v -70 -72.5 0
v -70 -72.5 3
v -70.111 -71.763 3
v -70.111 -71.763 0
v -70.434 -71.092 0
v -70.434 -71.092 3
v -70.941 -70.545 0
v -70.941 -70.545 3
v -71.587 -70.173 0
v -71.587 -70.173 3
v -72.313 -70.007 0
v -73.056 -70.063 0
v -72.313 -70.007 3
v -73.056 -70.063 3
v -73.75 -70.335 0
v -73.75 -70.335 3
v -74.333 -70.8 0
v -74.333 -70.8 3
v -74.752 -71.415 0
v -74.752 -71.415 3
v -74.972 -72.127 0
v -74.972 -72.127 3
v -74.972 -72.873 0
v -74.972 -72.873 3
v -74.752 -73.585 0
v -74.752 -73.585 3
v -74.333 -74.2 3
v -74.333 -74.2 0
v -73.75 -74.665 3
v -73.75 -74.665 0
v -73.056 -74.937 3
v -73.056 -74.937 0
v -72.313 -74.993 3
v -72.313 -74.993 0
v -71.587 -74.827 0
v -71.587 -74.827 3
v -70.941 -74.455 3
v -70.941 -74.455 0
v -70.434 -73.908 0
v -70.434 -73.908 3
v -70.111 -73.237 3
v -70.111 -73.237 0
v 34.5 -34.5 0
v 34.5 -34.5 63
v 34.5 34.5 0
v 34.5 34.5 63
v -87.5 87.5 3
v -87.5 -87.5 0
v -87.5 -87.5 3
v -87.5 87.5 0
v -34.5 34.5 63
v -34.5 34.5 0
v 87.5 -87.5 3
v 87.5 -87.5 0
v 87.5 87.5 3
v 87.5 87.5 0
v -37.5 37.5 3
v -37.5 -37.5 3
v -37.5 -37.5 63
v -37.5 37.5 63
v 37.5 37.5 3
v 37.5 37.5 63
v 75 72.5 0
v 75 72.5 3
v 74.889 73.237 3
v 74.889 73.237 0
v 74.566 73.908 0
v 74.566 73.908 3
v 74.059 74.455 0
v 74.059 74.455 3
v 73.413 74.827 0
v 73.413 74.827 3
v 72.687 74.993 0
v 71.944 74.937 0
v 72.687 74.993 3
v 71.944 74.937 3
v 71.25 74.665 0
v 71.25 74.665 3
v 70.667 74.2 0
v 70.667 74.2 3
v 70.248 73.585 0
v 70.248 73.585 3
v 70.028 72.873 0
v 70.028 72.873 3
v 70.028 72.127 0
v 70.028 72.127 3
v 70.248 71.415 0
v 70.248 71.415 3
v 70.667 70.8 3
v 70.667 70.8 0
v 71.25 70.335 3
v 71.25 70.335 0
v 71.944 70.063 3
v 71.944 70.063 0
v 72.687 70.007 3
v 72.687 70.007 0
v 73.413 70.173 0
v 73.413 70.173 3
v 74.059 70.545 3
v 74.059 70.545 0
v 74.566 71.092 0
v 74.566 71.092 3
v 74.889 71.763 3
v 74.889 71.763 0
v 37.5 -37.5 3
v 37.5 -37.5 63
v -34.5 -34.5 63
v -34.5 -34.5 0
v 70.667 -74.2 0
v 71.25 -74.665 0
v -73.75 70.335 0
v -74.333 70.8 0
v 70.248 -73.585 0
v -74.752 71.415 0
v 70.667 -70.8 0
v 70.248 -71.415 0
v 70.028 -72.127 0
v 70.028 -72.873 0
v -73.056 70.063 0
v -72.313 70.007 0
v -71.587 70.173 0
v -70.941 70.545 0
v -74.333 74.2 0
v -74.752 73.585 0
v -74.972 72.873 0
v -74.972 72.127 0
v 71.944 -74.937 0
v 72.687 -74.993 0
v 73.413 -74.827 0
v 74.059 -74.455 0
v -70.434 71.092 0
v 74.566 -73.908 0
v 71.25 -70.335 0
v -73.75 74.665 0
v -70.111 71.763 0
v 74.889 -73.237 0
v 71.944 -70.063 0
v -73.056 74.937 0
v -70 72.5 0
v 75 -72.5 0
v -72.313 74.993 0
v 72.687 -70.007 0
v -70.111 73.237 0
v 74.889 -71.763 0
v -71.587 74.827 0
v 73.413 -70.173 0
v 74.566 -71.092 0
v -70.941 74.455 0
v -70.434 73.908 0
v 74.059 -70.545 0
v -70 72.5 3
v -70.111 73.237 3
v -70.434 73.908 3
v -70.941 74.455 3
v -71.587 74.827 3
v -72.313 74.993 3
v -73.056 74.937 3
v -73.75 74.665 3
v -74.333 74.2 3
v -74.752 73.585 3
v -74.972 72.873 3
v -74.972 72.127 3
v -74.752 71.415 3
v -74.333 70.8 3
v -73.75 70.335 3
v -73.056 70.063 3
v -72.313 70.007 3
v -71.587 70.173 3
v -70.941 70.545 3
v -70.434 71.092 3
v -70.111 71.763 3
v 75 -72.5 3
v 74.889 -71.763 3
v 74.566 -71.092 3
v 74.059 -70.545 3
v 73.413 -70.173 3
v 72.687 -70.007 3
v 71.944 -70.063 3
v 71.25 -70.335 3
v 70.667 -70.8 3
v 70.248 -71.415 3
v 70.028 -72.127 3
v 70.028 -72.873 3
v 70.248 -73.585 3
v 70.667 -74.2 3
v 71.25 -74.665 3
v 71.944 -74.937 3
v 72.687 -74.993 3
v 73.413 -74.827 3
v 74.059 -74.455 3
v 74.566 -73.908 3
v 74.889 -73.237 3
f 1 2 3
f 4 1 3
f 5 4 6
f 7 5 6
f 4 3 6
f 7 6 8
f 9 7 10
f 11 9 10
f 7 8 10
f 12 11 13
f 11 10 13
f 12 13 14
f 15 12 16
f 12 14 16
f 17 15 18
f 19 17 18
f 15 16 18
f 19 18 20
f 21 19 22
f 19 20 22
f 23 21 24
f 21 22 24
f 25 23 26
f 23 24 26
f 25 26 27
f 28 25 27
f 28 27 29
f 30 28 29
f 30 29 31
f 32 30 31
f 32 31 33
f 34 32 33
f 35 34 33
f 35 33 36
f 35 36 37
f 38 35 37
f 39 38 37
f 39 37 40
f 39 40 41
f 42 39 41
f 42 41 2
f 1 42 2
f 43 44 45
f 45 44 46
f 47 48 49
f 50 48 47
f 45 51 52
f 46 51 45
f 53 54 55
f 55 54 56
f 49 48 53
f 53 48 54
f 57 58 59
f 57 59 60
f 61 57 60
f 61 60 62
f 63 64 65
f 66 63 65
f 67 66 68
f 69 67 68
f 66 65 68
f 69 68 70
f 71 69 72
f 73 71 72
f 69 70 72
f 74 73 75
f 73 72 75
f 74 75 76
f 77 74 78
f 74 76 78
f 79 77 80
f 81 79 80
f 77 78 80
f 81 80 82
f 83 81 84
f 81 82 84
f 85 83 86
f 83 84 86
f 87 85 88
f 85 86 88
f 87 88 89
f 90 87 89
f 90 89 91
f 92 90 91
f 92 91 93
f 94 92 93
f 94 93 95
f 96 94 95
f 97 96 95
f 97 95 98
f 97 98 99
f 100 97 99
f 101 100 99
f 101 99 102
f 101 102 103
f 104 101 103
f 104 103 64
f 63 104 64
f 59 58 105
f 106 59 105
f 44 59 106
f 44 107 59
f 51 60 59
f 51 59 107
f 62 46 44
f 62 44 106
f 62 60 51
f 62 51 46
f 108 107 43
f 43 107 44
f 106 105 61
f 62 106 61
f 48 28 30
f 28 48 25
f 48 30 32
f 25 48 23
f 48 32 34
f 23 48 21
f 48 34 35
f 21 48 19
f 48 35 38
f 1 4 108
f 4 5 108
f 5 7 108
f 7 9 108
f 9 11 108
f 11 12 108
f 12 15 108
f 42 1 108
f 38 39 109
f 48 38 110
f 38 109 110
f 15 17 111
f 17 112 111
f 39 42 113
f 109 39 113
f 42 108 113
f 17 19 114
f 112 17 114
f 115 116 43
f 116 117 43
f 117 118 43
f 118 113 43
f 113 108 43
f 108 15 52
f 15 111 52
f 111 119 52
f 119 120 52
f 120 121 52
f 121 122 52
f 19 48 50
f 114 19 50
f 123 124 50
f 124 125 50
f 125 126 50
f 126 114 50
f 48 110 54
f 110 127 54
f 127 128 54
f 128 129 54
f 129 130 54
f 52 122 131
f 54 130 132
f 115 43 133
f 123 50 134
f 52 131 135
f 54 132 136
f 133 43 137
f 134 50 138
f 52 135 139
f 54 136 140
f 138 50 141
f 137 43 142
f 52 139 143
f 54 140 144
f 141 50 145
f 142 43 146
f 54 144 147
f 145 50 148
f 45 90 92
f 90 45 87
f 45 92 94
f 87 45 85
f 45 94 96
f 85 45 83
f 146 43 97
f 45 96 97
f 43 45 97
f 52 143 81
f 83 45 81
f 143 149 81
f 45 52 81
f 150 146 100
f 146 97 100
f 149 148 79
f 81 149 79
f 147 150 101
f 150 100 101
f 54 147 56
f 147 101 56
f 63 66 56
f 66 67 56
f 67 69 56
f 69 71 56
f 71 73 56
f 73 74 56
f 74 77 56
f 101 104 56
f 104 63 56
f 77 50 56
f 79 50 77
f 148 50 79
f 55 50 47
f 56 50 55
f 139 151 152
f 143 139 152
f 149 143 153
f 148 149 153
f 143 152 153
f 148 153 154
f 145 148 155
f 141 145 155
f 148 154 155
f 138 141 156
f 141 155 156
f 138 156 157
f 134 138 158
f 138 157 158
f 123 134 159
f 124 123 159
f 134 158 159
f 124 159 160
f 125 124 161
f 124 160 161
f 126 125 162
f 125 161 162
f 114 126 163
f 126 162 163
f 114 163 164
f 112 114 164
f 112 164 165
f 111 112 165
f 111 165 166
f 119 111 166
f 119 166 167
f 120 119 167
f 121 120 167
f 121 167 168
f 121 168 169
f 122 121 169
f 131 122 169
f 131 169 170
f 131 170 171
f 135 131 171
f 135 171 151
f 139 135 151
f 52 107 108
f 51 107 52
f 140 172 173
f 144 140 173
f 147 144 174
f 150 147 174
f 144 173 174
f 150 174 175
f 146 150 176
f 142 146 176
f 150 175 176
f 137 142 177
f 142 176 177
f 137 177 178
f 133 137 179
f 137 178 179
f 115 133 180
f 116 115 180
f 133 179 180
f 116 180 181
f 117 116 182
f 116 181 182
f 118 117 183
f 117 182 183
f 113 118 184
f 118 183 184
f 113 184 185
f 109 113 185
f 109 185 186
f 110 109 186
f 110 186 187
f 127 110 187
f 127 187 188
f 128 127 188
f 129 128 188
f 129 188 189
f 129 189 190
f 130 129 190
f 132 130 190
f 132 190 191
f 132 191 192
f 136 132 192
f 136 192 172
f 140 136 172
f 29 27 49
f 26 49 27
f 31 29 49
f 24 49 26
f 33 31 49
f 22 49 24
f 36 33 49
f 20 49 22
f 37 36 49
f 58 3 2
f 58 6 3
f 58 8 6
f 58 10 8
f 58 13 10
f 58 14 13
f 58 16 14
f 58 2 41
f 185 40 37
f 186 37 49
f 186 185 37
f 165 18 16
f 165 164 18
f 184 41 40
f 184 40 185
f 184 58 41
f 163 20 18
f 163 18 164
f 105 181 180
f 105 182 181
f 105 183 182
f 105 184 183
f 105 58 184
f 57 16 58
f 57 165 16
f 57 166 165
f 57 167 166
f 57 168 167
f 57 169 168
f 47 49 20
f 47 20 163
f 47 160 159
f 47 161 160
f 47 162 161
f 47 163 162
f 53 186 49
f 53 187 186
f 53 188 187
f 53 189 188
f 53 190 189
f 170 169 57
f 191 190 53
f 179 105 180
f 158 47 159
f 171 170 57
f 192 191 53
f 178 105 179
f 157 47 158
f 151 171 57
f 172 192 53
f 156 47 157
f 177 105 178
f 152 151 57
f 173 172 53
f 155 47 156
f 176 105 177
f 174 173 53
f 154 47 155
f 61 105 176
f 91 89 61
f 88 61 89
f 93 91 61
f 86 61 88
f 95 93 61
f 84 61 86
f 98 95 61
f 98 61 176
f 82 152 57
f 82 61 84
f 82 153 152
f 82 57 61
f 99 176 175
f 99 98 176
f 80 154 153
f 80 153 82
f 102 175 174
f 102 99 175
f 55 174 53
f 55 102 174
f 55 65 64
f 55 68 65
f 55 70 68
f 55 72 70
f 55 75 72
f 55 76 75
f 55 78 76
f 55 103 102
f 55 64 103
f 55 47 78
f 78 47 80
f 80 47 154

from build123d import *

# Parameters (mm, degrees)
SKETCH_W     = 175
SKETCH_H     = 175
PAD_DEPTH    = 3
SKETCH001_R  = 2.5
HOLE_DEPTH   = 3.001
SKETCH002_W  = 75
SKETCH002_H  = 75
PAD001_DEPTH = 60
SKETCH003_W  = 69
SKETCH003_H  = 69
POCKET_DEPTH = 63.001


with BuildPart() as part:
    # Sketch → Pad (new body)
    with BuildSketch(Plane.XY):
        Rectangle(SKETCH_W, SKETCH_H)
    extrude(amount=PAD_DEPTH)

    # Sketch001 (on Face6 of Pad) → Hole (cut, through all)
    with BuildSketch(Plane.XY.offset(3)):
        with Locations((-72.5, 72.5)):
            Circle(SKETCH001_R)
        with Locations((72.5, 72.5)):
            Circle(SKETCH001_R)
        with Locations((-72.5, -72.5)):
            Circle(SKETCH001_R)
        with Locations((72.5, -72.5)):
            Circle(SKETCH001_R)
    extrude(amount=-HOLE_DEPTH, mode=Mode.SUBTRACT)

    # Sketch002 (on Face5 of Hole) → Pad001 (join)
    with BuildSketch(Plane.XY.offset(3)):
        Rectangle(SKETCH002_W, SKETCH002_H)
    extrude(amount=PAD001_DEPTH)

    # Sketch003 (on Face15 of Pad001) → Pocket (cut, through all)
    with BuildSketch(Plane.XY.offset(63)):
        Rectangle(SKETCH003_W, SKETCH003_H)
    extrude(amount=-POCKET_DEPTH, mode=Mode.SUBTRACT)


solid = part.part
